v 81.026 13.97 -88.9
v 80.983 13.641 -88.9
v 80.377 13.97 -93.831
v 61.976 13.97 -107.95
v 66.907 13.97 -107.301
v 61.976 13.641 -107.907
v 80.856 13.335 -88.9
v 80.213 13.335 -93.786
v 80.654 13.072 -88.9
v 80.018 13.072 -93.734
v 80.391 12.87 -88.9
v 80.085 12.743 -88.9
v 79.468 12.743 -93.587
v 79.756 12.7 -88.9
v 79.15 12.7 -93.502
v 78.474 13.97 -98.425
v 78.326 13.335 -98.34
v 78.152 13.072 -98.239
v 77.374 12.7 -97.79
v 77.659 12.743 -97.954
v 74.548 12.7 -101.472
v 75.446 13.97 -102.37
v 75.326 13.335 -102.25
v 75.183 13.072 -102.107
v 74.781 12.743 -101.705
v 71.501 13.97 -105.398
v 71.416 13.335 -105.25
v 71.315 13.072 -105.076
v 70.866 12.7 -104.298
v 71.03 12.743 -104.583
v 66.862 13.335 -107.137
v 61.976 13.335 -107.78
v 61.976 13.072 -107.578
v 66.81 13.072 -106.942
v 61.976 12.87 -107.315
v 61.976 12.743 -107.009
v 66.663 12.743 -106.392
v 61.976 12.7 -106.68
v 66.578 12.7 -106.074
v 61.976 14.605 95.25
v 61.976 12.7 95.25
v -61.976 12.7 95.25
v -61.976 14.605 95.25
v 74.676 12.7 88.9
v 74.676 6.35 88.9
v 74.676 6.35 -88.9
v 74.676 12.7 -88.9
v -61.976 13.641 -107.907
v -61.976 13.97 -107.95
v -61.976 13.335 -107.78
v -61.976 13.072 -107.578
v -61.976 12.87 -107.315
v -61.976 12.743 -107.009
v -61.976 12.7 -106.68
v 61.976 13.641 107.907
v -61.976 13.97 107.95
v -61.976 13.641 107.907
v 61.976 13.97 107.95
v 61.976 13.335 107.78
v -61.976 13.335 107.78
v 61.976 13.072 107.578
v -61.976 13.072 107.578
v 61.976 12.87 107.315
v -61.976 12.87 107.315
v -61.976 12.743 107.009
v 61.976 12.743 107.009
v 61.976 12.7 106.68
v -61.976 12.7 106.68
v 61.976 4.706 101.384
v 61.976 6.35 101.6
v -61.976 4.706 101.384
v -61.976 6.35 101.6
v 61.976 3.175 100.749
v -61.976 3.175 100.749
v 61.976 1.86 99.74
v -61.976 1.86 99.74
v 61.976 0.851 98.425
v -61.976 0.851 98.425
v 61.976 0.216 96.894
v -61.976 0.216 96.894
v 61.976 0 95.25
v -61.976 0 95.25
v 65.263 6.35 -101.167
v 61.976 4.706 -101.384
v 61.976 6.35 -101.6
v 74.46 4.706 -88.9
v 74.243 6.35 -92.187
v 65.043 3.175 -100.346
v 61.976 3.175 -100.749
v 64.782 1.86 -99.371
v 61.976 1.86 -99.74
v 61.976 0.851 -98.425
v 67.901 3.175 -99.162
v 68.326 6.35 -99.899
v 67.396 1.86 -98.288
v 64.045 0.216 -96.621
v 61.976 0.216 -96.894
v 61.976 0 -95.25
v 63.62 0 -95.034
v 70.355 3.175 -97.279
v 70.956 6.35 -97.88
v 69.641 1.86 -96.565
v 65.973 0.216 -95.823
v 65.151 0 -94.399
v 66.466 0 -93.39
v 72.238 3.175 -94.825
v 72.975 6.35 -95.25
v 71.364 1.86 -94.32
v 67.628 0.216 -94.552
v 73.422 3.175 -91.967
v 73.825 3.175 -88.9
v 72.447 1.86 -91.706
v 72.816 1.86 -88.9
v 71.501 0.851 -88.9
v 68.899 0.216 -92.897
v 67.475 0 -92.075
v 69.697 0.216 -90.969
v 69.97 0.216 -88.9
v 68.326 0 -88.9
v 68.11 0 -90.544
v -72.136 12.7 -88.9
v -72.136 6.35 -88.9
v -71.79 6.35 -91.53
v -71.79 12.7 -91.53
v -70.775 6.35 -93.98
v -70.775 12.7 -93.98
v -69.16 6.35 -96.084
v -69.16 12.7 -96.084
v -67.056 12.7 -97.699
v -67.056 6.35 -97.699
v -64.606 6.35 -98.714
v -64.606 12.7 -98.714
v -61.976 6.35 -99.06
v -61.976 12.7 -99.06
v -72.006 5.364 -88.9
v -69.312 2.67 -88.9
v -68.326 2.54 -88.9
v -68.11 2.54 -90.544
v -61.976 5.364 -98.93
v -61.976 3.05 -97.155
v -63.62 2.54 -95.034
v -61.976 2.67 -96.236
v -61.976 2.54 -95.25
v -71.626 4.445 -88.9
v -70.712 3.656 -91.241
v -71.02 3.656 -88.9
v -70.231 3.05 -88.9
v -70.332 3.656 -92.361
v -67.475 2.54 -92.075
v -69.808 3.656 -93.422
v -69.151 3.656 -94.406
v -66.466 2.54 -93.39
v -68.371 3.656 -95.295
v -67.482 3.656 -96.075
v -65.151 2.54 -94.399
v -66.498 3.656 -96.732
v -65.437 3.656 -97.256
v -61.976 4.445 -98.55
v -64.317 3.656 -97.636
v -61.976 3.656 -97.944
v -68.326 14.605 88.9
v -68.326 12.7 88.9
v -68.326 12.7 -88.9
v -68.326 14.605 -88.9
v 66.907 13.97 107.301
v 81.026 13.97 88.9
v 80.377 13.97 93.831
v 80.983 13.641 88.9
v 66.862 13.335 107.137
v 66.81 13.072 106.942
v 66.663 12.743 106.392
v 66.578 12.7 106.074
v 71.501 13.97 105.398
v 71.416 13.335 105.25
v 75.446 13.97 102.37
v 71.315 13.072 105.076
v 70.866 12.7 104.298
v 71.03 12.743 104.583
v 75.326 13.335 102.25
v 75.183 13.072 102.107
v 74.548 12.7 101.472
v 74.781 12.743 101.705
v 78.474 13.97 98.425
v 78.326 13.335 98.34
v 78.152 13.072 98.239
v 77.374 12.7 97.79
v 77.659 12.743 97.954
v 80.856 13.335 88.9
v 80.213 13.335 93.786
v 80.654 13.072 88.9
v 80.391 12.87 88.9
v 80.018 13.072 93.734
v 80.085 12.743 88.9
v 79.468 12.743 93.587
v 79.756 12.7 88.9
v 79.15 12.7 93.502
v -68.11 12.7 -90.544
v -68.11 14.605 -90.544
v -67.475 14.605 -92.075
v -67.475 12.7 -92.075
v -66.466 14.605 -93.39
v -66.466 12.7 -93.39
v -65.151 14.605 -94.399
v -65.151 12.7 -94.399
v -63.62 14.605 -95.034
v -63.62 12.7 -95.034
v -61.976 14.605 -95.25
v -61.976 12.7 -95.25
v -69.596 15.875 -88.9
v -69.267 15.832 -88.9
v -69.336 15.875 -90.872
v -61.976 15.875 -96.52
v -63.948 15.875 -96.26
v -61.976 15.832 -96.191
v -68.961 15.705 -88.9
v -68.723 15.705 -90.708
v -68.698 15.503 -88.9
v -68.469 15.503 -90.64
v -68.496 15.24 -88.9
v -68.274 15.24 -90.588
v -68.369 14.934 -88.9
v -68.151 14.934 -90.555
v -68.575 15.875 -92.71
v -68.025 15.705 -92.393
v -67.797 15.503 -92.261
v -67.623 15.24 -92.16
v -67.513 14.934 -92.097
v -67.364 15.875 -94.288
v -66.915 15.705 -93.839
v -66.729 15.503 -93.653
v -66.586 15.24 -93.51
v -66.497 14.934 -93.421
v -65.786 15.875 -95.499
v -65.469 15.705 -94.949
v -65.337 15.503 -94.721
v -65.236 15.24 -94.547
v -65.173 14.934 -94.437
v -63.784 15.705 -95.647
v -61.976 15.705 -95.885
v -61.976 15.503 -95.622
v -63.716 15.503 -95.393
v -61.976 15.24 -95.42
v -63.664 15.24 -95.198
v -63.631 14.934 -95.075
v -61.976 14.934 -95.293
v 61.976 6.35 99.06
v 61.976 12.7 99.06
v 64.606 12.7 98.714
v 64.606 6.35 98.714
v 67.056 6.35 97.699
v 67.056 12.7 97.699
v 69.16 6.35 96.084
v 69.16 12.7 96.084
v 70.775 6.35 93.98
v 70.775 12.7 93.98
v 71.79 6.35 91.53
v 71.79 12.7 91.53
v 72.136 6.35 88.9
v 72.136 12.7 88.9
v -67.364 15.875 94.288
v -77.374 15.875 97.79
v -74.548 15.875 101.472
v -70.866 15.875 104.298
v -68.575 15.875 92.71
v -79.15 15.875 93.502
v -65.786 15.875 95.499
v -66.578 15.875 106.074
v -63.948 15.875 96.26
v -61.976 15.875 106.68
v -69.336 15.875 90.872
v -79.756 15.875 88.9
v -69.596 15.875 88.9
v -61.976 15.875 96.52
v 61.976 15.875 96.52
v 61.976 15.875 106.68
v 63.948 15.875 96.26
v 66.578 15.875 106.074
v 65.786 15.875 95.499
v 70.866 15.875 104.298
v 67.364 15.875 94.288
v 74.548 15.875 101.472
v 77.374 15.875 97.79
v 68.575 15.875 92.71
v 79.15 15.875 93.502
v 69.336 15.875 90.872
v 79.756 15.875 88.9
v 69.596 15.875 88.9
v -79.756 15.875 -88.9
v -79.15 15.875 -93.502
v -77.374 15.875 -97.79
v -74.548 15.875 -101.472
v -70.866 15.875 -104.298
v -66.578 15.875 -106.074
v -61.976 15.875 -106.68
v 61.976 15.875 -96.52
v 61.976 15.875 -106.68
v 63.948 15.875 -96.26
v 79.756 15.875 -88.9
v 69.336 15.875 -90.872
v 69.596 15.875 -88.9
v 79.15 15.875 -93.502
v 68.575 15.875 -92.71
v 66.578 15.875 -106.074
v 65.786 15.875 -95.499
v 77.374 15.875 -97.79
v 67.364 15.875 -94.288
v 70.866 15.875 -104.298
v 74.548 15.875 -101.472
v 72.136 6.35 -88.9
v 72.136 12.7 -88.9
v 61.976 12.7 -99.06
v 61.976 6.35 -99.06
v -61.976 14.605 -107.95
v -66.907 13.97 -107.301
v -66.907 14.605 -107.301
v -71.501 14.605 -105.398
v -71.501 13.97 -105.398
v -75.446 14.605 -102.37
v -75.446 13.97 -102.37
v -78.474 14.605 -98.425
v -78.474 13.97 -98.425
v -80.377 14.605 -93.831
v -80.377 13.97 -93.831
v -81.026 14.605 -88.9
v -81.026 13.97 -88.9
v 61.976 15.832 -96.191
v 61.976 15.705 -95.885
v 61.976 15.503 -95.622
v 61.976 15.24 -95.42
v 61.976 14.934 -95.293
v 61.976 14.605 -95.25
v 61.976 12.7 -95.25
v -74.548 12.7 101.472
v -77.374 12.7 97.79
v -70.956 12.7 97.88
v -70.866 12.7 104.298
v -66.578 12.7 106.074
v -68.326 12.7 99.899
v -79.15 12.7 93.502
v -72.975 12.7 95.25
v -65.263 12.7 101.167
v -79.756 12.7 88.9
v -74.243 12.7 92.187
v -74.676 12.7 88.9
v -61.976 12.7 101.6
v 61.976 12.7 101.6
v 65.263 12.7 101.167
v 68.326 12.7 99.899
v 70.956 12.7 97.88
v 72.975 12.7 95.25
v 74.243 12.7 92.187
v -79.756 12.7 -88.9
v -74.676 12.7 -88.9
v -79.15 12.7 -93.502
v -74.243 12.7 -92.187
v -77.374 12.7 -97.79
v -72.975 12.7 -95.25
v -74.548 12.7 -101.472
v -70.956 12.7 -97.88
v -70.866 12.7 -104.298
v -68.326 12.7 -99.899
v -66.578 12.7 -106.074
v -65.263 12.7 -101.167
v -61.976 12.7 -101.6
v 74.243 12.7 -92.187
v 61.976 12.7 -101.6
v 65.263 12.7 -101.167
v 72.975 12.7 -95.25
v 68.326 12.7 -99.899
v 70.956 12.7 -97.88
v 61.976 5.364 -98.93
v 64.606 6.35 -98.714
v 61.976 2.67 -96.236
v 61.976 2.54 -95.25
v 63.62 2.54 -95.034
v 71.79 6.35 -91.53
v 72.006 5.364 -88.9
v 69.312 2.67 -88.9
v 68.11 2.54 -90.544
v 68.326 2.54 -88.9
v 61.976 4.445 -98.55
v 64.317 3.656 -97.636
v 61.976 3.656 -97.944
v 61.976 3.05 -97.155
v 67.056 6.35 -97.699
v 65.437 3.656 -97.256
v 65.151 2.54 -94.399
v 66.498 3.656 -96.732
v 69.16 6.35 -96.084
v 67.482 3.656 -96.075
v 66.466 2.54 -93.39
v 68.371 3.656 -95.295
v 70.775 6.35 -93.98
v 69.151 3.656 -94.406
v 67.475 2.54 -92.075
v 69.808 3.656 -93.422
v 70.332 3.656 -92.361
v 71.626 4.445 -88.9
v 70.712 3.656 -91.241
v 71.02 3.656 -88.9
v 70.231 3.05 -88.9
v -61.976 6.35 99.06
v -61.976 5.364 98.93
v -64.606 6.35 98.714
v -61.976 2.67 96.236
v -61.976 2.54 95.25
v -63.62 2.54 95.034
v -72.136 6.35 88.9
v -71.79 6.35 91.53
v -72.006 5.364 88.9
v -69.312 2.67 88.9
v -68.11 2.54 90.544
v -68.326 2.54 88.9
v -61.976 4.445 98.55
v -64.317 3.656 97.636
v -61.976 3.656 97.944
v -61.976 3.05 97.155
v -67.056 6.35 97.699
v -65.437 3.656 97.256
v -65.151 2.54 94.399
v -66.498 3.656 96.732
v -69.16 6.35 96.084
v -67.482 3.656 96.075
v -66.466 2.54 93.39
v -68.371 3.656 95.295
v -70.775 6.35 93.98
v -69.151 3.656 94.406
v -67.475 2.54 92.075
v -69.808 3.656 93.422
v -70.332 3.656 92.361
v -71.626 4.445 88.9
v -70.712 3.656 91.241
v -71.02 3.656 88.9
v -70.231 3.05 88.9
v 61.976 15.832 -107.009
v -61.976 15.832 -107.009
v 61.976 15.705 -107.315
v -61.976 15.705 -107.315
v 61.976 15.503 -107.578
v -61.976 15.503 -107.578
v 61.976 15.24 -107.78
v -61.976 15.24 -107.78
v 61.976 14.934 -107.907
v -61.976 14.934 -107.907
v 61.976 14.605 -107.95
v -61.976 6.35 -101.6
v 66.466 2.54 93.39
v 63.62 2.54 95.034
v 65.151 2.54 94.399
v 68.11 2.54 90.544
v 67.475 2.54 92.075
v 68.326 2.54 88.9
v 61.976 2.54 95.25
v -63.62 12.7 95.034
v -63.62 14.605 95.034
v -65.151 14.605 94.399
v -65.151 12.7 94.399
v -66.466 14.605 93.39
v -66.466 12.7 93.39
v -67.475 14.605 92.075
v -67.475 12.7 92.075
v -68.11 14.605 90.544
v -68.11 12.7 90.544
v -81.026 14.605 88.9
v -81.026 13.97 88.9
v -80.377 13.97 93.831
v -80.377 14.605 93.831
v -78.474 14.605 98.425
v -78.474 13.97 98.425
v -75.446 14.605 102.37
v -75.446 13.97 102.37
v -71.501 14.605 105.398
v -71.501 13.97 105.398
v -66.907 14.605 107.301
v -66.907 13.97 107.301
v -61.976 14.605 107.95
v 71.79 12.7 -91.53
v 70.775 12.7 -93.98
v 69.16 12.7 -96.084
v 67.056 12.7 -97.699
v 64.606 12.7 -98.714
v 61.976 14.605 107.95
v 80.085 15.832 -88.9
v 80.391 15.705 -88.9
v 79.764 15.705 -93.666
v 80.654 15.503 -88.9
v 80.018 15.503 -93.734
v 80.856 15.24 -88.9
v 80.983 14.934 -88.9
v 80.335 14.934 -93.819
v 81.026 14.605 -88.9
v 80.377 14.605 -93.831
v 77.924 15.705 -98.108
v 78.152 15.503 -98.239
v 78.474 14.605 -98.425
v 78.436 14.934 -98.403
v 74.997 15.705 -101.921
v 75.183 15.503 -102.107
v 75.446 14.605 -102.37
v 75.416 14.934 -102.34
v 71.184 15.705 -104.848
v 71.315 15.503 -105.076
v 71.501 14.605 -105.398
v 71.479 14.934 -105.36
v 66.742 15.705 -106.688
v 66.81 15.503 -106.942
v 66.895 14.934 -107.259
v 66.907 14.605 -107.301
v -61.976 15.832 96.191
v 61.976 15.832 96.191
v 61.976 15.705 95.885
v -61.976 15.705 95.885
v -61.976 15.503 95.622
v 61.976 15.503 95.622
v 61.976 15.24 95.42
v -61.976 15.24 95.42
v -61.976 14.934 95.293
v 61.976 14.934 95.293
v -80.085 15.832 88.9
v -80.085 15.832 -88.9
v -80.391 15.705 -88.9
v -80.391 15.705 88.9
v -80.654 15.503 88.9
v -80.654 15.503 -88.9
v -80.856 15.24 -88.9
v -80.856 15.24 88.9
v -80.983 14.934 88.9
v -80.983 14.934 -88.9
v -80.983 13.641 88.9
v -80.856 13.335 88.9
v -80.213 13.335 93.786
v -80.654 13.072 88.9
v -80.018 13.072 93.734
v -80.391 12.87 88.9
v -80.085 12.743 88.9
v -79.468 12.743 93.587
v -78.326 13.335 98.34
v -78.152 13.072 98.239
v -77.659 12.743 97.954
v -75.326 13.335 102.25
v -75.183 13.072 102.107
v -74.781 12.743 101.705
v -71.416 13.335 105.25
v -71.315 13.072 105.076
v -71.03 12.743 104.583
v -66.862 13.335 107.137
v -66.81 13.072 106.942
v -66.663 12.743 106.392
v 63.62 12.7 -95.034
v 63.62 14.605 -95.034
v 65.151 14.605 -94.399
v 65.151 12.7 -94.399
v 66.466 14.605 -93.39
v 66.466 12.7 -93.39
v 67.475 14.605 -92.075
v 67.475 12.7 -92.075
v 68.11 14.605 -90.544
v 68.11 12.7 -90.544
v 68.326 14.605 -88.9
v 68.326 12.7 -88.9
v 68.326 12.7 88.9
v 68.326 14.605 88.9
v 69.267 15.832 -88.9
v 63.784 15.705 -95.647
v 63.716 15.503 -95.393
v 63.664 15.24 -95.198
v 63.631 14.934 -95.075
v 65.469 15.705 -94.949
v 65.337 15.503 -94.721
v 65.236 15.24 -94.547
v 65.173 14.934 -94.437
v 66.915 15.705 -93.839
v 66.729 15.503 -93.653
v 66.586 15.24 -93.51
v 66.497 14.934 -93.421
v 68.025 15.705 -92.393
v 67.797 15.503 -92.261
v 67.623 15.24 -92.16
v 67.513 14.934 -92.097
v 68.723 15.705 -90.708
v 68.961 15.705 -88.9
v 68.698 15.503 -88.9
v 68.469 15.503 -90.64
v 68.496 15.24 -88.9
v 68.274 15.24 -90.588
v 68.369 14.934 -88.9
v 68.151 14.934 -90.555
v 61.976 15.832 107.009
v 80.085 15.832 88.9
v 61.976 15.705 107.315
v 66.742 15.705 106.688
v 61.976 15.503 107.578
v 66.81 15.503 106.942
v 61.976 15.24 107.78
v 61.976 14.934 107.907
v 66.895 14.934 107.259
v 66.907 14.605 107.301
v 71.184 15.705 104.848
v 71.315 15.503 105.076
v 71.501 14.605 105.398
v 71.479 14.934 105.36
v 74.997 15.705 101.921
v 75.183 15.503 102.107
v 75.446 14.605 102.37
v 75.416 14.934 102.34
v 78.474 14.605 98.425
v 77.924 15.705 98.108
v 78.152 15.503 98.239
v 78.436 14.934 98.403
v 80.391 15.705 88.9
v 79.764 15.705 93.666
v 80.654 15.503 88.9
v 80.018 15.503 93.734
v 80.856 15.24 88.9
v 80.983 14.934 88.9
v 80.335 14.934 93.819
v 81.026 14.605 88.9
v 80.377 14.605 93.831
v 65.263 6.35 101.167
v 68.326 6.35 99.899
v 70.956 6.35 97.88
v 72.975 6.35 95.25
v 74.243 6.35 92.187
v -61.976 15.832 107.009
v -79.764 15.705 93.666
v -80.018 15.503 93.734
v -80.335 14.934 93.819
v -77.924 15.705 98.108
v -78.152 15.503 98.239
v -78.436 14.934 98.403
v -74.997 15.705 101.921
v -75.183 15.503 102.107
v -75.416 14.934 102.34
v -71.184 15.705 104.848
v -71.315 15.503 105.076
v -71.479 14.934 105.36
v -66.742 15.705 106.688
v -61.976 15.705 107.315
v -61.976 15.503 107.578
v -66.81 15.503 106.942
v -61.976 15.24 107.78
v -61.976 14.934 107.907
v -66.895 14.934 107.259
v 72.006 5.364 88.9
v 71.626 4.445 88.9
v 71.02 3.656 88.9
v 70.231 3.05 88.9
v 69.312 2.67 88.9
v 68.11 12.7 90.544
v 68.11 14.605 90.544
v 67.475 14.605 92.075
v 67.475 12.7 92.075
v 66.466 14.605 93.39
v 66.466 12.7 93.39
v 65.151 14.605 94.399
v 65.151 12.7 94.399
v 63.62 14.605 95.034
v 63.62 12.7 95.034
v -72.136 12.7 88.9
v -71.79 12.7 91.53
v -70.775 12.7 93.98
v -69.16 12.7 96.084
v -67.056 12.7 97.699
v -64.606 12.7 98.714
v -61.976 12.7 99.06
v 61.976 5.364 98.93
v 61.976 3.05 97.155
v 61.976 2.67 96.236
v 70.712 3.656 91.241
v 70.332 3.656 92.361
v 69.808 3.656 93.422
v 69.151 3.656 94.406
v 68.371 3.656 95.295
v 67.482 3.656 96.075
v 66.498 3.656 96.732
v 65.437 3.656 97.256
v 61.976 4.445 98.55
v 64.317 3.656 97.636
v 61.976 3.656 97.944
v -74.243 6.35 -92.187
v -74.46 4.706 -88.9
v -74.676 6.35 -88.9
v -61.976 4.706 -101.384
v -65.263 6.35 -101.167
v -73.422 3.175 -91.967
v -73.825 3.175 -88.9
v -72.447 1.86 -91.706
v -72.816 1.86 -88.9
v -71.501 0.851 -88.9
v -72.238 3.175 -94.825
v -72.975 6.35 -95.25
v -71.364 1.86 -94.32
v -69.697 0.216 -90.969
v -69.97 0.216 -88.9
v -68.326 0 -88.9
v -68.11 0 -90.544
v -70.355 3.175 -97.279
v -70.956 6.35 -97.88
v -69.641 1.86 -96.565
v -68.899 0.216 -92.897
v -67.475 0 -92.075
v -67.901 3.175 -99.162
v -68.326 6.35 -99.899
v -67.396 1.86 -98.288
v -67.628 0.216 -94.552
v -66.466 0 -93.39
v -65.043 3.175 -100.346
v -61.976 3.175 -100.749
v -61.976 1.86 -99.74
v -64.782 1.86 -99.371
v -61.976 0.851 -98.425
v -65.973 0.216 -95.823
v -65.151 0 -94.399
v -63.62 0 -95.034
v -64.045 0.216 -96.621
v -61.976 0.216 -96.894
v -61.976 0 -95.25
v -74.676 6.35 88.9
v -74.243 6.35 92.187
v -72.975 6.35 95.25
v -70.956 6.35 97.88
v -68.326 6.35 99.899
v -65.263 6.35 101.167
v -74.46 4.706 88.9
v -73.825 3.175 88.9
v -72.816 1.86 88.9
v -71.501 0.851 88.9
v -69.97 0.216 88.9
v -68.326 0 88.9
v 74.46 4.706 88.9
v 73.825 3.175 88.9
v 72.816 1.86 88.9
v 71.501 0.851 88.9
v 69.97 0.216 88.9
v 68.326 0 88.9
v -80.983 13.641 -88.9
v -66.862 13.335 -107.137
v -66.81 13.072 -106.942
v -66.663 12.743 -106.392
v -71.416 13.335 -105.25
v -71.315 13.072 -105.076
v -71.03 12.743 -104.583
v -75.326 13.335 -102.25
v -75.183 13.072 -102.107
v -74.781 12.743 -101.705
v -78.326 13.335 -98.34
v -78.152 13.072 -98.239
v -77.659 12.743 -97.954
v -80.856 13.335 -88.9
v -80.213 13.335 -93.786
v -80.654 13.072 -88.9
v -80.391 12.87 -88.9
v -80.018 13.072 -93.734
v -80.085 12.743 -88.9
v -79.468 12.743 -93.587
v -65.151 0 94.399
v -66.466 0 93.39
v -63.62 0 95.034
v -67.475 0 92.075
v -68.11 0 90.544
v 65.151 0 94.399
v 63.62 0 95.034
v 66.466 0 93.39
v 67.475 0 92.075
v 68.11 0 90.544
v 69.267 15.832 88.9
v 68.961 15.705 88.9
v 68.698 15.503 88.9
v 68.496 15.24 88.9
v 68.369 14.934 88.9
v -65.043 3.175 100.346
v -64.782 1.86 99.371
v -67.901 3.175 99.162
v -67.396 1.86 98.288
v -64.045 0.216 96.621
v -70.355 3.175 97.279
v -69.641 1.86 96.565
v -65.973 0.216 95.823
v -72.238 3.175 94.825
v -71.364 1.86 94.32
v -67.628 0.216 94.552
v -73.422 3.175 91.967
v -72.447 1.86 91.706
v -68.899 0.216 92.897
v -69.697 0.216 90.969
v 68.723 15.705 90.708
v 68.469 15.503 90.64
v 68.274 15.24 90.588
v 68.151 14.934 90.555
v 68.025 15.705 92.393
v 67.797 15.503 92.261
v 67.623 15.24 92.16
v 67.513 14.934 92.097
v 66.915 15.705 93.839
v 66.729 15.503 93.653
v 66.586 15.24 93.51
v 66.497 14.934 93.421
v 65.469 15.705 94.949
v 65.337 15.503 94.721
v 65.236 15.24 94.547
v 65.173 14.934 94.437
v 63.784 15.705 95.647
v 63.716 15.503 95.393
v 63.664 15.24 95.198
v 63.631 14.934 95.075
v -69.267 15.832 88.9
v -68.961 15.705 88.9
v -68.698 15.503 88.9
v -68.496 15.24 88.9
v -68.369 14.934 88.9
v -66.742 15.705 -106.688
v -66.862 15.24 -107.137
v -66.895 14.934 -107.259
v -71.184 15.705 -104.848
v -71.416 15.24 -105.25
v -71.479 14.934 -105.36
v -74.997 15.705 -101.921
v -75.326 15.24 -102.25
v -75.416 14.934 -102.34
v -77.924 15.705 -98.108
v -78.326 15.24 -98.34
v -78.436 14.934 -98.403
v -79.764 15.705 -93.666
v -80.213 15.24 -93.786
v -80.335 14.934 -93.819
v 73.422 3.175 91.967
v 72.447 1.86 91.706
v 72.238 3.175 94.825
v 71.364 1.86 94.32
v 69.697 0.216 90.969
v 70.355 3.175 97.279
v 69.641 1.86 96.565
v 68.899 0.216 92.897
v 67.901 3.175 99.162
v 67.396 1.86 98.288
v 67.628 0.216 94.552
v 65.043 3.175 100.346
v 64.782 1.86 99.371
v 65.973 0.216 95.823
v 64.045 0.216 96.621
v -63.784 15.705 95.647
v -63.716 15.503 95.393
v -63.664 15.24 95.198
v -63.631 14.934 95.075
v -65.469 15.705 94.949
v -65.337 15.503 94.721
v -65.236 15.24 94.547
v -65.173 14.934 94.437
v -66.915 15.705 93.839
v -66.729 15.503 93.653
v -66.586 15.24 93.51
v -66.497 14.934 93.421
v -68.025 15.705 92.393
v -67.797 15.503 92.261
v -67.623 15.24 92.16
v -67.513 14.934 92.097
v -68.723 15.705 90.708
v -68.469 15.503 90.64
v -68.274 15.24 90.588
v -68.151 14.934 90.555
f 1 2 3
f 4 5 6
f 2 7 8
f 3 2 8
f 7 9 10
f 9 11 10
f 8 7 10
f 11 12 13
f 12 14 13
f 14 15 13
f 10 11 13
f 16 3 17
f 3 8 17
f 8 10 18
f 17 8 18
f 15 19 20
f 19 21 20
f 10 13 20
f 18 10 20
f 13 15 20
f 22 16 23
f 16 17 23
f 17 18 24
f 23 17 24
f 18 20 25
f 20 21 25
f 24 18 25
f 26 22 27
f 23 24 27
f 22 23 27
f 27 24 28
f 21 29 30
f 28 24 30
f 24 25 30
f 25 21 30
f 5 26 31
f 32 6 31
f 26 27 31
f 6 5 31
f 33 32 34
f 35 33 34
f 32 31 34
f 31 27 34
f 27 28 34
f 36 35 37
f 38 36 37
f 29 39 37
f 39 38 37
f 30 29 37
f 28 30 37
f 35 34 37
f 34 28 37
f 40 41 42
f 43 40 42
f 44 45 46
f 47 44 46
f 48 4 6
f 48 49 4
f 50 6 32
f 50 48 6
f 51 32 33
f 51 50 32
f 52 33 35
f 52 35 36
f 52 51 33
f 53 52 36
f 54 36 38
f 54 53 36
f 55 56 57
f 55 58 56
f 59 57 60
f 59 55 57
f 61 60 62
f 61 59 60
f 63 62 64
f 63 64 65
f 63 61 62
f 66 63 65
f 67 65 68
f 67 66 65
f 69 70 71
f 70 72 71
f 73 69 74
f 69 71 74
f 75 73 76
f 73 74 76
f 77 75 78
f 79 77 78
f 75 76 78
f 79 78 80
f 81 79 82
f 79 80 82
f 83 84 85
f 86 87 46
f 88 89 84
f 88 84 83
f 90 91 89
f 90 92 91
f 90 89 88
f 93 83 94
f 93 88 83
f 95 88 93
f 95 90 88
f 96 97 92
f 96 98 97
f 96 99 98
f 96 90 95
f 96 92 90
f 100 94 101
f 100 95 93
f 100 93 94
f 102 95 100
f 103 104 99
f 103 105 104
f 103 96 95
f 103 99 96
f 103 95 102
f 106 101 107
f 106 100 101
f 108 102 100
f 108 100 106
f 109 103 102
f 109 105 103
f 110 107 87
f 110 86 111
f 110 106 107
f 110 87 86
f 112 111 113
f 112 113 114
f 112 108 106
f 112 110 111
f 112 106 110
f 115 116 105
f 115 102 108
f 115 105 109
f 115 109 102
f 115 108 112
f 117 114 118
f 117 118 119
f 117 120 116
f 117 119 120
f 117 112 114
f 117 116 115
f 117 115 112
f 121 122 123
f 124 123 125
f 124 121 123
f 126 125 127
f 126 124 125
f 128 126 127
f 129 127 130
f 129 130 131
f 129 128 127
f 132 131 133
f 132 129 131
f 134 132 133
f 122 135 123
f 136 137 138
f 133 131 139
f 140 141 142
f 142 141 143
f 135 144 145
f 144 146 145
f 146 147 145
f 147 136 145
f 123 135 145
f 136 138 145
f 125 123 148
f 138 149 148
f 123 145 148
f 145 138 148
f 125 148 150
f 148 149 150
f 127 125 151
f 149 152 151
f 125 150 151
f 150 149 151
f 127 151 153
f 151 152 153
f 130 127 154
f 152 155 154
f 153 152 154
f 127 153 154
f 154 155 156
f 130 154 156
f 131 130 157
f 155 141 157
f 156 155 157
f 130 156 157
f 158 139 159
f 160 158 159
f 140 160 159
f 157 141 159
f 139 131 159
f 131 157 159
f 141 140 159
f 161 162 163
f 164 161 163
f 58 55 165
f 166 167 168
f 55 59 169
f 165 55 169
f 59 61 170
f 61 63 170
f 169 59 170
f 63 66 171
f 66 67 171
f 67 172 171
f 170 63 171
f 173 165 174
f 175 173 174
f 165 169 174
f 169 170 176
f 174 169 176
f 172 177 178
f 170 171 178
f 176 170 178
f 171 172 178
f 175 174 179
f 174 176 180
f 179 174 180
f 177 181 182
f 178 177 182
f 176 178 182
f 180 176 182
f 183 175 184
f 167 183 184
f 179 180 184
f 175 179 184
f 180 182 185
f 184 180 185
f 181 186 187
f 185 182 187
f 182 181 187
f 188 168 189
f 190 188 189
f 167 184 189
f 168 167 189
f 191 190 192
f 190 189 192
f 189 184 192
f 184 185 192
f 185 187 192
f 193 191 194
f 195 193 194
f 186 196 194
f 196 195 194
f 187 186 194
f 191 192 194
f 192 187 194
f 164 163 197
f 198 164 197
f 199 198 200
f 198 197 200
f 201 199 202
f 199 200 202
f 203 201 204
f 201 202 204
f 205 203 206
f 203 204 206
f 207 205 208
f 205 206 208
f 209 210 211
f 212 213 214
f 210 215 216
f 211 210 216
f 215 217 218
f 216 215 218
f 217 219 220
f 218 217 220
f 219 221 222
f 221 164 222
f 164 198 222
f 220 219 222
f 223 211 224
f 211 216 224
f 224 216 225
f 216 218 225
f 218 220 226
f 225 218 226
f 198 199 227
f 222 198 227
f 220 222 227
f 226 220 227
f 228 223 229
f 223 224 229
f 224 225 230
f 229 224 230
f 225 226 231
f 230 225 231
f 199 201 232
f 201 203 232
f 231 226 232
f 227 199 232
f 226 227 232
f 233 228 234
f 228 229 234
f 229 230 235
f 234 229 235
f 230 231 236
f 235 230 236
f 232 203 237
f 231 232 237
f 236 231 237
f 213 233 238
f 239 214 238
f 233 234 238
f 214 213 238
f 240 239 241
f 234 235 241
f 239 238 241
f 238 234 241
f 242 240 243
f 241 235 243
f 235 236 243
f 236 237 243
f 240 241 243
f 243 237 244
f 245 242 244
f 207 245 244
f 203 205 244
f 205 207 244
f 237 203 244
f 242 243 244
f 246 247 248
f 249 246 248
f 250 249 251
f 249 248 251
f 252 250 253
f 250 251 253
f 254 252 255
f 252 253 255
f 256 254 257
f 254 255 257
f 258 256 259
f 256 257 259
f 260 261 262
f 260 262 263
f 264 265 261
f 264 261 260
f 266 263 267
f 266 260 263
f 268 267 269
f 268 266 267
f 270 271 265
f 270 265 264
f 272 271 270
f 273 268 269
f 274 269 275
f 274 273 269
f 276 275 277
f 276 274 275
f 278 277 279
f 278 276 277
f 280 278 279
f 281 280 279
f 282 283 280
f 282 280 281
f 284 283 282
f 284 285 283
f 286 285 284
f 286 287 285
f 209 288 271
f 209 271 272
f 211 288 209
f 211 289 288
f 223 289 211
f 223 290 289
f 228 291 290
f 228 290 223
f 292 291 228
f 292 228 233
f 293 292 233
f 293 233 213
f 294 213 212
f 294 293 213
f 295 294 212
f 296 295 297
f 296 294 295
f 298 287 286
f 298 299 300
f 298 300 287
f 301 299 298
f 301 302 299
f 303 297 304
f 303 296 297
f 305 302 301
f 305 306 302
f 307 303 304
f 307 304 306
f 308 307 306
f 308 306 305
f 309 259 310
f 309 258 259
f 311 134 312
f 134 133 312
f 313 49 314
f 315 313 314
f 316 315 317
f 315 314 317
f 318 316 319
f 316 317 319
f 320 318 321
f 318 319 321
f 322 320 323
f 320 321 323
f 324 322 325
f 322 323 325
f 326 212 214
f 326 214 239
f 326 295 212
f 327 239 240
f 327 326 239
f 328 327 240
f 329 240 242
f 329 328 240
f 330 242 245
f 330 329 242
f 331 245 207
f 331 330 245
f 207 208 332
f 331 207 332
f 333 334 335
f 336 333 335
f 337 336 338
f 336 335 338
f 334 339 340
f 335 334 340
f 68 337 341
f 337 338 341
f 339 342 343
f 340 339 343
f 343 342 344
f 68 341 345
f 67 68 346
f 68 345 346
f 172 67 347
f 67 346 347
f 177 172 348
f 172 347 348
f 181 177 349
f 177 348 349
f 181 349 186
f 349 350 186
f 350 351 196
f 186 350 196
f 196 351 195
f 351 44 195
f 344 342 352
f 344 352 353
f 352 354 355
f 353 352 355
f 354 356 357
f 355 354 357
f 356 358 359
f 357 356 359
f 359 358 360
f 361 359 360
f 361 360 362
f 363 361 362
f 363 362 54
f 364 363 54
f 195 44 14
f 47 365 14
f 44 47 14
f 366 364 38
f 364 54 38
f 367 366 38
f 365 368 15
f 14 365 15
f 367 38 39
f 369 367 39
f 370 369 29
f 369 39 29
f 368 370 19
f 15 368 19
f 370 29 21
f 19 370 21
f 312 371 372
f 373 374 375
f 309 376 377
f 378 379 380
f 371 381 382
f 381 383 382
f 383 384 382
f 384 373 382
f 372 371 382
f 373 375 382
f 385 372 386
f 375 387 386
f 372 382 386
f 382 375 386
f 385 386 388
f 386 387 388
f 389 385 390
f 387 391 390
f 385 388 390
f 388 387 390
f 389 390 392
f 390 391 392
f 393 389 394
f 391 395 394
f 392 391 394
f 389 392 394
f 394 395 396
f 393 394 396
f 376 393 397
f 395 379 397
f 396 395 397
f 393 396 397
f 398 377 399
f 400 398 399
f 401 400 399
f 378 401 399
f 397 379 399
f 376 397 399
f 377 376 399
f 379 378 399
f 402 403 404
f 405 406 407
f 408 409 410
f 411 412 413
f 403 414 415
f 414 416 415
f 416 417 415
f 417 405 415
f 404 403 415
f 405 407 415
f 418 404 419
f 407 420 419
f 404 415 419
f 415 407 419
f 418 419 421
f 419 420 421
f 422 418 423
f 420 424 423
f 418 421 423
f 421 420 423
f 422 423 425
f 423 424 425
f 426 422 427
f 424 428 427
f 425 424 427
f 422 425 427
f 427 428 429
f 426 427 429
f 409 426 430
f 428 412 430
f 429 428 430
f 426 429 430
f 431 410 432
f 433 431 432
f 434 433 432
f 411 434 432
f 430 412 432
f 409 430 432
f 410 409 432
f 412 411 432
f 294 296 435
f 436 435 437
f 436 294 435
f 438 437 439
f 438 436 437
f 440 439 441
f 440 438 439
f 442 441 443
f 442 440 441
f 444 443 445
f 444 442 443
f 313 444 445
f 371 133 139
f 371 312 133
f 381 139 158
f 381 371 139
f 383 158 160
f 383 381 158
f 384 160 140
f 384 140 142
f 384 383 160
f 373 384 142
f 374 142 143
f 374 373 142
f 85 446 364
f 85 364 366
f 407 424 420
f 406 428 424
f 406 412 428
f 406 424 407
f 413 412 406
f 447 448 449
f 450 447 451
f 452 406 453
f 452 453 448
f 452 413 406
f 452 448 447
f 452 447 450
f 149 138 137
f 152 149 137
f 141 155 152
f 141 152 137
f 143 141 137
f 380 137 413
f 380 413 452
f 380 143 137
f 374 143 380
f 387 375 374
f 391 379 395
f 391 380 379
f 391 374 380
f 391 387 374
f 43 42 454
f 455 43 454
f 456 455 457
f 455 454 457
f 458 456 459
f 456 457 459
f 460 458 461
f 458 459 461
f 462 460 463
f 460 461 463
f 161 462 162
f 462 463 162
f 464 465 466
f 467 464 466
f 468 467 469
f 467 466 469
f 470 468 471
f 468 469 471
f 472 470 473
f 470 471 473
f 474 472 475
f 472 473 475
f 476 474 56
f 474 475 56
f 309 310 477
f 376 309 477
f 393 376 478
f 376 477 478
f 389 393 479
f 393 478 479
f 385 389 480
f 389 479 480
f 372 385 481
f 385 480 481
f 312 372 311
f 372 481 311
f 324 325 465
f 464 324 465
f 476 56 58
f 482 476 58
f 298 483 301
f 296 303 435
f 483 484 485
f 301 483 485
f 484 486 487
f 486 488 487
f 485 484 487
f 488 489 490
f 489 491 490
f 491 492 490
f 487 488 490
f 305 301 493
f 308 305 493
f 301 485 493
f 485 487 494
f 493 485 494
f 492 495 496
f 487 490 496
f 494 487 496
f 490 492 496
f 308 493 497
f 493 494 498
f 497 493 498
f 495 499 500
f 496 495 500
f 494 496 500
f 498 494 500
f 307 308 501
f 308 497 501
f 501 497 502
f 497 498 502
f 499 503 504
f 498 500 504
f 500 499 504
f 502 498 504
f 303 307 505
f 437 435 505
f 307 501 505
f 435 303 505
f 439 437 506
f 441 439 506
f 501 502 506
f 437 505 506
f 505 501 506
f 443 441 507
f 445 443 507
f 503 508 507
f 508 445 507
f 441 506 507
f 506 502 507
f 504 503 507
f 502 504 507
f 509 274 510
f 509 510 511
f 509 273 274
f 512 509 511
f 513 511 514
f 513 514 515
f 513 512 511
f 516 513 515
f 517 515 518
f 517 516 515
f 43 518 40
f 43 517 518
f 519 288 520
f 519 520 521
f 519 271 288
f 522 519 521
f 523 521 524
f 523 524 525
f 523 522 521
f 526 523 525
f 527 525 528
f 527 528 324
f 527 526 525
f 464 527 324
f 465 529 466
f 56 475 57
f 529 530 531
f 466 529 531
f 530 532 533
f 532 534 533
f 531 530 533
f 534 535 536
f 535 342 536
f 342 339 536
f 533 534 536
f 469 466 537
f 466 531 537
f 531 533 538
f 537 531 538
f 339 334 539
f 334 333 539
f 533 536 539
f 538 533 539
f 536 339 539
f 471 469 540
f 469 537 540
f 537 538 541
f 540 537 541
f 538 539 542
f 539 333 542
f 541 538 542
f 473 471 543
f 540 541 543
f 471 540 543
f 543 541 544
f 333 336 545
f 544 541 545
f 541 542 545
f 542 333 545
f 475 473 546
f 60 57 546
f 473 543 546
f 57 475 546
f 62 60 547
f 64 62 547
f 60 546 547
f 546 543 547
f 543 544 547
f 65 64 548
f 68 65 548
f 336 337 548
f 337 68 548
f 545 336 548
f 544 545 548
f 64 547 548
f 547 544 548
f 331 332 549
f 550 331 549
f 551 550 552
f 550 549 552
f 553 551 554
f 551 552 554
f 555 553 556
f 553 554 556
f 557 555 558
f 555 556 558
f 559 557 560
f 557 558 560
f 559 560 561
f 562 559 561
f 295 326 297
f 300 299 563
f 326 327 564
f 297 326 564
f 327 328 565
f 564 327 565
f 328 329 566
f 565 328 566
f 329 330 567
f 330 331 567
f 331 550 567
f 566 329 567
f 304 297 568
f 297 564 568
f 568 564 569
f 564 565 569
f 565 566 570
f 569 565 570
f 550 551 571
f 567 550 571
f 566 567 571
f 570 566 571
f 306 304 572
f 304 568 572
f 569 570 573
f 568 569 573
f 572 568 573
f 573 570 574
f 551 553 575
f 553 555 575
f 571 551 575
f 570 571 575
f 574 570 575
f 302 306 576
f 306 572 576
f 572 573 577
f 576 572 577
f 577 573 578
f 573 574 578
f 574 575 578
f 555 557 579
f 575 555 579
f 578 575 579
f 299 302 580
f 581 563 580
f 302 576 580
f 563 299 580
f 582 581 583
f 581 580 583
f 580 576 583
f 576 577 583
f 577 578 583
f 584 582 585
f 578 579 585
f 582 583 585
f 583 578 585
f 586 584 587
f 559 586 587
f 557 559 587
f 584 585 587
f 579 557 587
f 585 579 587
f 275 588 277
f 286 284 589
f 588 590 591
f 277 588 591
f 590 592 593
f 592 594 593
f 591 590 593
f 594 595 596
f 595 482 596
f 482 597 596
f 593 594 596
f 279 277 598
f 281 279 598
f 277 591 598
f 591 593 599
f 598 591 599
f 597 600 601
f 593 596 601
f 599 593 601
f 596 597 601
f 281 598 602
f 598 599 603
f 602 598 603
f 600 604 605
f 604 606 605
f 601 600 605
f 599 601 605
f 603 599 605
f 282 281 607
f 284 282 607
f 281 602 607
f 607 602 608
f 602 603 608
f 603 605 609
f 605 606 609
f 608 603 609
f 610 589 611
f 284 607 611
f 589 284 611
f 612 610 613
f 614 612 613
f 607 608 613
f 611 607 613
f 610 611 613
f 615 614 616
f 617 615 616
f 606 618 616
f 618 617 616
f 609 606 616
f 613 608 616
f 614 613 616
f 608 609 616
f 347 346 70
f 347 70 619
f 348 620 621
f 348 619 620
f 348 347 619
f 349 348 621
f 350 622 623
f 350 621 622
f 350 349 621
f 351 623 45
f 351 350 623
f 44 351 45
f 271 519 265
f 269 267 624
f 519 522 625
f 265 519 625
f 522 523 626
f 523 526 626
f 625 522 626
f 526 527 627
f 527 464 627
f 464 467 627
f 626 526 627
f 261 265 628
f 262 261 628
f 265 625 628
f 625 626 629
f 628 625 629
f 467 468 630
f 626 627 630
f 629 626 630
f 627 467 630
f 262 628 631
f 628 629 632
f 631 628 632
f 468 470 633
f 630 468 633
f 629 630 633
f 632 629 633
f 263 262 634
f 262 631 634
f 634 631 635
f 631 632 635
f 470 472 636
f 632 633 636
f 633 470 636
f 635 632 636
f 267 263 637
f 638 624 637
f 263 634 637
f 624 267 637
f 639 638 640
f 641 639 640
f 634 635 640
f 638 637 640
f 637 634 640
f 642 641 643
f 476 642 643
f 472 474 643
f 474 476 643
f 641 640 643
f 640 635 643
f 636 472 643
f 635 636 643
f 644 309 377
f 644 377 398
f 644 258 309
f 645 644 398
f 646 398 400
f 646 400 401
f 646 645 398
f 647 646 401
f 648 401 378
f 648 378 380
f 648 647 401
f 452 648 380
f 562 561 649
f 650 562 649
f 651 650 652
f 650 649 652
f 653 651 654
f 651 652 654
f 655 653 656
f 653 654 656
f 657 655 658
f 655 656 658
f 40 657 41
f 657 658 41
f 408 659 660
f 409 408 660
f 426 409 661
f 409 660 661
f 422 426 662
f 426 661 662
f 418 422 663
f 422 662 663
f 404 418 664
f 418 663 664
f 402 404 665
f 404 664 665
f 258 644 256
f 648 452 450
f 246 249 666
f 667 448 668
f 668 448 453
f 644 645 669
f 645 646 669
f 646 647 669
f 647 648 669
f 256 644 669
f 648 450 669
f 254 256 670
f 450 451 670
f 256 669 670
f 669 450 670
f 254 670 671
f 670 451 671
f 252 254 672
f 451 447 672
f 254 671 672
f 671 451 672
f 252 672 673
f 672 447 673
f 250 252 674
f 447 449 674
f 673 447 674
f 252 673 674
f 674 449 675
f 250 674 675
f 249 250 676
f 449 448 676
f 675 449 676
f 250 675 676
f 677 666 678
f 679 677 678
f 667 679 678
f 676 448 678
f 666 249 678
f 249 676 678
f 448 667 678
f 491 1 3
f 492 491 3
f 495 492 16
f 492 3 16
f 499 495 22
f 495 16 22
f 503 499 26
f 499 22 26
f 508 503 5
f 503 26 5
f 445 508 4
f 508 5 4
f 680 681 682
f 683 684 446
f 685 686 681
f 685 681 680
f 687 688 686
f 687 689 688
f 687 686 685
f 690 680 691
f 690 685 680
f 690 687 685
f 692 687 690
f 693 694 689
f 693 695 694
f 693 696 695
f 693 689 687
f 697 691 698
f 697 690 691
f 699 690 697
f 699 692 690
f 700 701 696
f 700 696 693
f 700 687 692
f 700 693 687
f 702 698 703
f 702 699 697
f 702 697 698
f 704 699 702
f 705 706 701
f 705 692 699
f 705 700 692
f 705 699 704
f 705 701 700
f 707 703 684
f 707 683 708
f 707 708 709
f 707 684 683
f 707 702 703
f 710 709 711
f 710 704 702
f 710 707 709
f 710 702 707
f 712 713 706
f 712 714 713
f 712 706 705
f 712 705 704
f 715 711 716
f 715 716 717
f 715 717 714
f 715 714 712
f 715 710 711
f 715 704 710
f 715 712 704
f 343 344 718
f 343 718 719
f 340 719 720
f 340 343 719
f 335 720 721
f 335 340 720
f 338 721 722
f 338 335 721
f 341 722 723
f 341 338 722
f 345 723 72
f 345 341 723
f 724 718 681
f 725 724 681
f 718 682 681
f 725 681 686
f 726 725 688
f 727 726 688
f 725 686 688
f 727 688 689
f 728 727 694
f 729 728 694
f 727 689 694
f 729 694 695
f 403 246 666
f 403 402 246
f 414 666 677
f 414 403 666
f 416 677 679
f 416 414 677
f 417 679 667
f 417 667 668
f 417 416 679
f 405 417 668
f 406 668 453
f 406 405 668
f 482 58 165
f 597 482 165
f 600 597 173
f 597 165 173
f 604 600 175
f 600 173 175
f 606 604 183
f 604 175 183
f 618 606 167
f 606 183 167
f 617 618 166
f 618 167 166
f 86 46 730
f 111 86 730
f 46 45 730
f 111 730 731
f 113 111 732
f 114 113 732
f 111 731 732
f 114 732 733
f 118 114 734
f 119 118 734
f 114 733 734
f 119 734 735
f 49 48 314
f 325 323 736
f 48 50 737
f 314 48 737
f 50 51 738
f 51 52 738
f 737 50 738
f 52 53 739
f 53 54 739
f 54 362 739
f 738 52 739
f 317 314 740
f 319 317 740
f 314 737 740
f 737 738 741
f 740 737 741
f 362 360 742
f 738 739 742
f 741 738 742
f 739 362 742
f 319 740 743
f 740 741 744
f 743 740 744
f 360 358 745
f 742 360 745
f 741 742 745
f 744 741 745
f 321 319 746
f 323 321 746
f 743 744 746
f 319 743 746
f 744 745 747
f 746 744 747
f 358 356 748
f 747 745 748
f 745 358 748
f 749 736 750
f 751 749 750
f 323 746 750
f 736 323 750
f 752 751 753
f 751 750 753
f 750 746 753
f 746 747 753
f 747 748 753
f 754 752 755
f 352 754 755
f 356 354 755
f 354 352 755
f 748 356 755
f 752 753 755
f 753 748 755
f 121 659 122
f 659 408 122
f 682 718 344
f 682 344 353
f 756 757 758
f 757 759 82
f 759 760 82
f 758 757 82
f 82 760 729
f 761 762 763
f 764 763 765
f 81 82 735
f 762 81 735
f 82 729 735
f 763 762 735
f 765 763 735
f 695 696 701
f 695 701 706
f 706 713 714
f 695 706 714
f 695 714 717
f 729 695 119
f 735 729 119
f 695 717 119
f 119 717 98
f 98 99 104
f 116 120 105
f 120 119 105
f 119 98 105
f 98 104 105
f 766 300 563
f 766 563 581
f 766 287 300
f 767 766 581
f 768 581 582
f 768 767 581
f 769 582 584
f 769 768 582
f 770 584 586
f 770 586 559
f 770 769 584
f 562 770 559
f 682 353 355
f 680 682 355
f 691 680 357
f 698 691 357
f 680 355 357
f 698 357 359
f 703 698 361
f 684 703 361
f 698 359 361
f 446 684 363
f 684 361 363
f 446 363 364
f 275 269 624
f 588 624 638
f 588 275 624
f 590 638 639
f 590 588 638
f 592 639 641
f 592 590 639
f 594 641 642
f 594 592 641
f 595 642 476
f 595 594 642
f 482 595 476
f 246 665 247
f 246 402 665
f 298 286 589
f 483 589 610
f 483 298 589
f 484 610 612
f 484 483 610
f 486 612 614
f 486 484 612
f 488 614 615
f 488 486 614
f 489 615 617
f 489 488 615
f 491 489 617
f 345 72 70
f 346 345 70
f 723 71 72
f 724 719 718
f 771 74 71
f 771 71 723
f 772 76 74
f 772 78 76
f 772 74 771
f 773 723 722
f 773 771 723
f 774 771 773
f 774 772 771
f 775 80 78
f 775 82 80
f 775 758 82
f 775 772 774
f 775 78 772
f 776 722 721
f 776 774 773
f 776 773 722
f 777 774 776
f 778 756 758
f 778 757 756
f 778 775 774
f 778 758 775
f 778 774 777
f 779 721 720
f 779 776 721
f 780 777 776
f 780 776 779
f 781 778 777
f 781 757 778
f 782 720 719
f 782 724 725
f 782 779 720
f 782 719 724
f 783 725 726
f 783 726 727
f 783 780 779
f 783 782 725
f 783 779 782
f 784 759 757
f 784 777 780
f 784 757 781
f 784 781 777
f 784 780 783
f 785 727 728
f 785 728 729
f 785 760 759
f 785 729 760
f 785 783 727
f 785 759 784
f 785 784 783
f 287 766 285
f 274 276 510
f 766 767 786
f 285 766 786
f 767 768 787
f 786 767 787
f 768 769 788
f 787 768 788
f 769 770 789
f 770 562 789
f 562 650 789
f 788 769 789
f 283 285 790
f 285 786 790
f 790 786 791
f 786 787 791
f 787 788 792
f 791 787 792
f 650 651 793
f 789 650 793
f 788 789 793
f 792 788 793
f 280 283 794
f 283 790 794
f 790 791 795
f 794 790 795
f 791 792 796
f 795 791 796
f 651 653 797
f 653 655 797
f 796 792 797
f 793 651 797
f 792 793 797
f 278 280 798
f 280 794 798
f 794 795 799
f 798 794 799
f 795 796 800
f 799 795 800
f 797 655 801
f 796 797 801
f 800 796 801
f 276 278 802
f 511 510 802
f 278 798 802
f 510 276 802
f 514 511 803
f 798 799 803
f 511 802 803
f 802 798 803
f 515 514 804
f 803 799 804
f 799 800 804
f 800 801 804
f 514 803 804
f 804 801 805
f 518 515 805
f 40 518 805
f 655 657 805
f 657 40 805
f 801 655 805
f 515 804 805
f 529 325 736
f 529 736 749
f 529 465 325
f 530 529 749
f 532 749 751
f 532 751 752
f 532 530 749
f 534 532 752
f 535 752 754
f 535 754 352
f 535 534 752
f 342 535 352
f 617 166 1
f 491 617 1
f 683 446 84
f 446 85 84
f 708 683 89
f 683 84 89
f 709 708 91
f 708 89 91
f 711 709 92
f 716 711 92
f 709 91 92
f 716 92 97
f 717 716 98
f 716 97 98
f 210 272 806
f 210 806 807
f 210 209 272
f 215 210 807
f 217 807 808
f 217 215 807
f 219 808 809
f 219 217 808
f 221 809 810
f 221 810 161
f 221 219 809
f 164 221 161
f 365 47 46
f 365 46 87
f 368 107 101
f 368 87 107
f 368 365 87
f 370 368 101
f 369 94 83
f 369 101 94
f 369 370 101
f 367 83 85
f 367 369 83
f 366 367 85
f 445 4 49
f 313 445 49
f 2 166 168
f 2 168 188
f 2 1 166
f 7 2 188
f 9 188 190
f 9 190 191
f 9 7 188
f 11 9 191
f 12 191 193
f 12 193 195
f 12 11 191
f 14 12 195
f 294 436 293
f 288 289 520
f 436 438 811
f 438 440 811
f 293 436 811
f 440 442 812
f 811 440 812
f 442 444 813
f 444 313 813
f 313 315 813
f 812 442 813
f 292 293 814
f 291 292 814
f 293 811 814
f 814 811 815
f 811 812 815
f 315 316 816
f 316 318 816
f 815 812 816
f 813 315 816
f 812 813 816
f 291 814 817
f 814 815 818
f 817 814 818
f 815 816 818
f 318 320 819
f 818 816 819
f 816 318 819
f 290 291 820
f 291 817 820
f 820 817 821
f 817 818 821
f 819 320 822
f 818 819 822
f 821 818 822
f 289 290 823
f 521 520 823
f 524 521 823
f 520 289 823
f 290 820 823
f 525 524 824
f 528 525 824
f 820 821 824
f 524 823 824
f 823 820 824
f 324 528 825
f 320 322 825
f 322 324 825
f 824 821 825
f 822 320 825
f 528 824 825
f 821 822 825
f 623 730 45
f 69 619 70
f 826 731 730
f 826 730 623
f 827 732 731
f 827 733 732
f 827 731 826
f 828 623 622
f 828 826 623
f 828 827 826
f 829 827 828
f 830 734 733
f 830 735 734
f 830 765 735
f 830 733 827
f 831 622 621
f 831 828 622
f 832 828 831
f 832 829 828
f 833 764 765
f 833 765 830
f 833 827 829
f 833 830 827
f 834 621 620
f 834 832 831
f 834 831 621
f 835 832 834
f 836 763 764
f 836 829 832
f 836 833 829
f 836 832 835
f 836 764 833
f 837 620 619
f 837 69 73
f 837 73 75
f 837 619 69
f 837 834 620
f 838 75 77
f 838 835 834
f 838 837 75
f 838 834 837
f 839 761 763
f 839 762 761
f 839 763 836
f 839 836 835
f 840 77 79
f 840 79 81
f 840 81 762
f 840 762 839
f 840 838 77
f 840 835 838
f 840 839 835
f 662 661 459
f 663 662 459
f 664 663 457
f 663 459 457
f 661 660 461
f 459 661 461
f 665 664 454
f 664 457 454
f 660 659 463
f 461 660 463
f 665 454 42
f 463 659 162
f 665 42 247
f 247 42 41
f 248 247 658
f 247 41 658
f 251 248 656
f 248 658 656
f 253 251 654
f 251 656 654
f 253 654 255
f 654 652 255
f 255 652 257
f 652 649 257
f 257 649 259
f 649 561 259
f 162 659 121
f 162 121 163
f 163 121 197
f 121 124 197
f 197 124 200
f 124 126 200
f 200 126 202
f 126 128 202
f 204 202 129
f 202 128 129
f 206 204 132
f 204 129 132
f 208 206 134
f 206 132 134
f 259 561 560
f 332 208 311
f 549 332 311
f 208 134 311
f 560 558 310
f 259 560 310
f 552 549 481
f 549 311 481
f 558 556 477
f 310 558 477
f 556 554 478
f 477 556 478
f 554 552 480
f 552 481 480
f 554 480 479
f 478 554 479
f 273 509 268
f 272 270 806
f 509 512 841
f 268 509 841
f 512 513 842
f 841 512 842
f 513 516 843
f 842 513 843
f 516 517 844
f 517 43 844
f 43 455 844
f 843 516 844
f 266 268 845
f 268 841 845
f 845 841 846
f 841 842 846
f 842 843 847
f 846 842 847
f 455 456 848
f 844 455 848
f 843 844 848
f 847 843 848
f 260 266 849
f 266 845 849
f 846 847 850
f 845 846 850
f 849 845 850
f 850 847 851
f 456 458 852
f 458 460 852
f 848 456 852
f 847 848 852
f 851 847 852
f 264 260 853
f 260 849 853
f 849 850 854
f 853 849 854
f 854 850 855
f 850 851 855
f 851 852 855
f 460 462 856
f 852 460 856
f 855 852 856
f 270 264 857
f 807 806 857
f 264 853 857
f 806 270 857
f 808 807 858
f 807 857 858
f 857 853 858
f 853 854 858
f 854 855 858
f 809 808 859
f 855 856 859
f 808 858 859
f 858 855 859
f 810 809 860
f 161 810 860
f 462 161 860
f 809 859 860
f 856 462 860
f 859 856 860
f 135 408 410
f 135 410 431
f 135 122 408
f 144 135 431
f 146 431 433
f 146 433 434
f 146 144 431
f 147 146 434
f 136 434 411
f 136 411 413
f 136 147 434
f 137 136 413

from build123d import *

# Parameters (mm, degrees)
SKETCH1_W           = 149.352
SKETCH1_H           = 203.2
BOSS_EXTRUDE1_DEPTH = 12.7
FILLET1_R           = 12.7
FILLET3_R           = 6.35
SHELL1_T            = -2.54
BOSS_EXTRUDE2_DEPTH = 3.175
FILLET2_R           = 1.27


with BuildPart() as part:
    # Sketch1 → Boss-Extrude1 (new body)
    with BuildSketch(Plane(origin=(0, 0, 0), x_dir=(1, 0, 0), z_dir=(0, 1, 0))):
        Rectangle(SKETCH1_W, SKETCH1_H)
    extrude(amount=BOSS_EXTRUDE1_DEPTH)

    # Fillet1
    fillet1_edges = [part.edges().sort_by_distance(p)[0] for p in [
        (74.676, 6.35, 101.6),
        (-74.676, 6.35, 101.6),
        (-74.676, 6.35, -101.6),
        (74.676, 6.35, -101.6),
    ]]
    fillet(fillet1_edges, radius=FILLET1_R)

    # Fillet3
    fillet3_edges = [part.edges().sort_by_distance(p)[0] for p in [
        (-74.676, 0, 0),
        (74.676, 0, 0),
        (0, 0, 101.6),
        (0, 0, -101.6),
        (70.956256121, 0, 97.880256121),
        (70.956256121, 0, -97.880256121),
        (-70.956256121, 0, 97.880256121),
        (-70.956256121, 0, -97.880256121),
    ]]
    fillet(fillet3_edges, radius=FILLET3_R)

    # Shell1
    shell1_openings = [part.faces().sort_by_distance(p)[0] for p in [
        (0, 12.7, 0),
    ]]
    offset(amount=SHELL1_T, openings=shell1_openings, kind=Kind.INTERSECTION)

    # Sketch2 → Boss-Extrude2 (add)
    with BuildSketch(Plane(origin=(0, 12.7, 0), x_dir=(1, 0, 0), z_dir=(0, 1, 0))):
        with BuildLine():
            Line((61.976, 107.95), (-61.976, 107.95))
            ThreePointArc((-61.976, 107.95), (-75.446384182, 102.370384182), (-81.026, 88.9))
            Line((-81.026, 88.9), (-81.026, -88.9))
            ThreePointArc((-81.026, -88.9), (-75.446384182, -102.370384182), (-61.976, -107.95))
            Line((-61.976, -107.95), (61.976, -107.95))
            ThreePointArc((61.976, -107.95), (75.446384182, -102.370384182), (81.026, -88.9))
            Line((81.026, -88.9), (81.026, 88.9))
            ThreePointArc((81.026, 88.9), (75.446384182, 102.370384182), (61.976, 107.95))
        make_face()
        with BuildLine():
            Line((-68.326, -88.9), (-68.326, 88.9))
            ThreePointArc((-68.326, 88.9), (-66.466128061, 93.390128061), (-61.976, 95.25))
            Line((-61.976, 95.25), (61.976, 95.25))
            ThreePointArc((61.976, 95.25), (66.466128061, 93.390128061), (68.326, 88.9))
            Line((68.326, 88.9), (68.326, -88.9))
            ThreePointArc((68.326, -88.9), (66.466128061, -93.390128061), (61.976, -95.25))
            Line((61.976, -95.25), (-61.976, -95.25))
            ThreePointArc((-61.976, -95.25), (-66.466128061, -93.390128061), (-68.326, -88.9))
        make_face(mode=Mode.SUBTRACT)
    extrude(amount=BOSS_EXTRUDE2_DEPTH)

    # Fillet2
    fillet2_edges = [part.edges().sort_by_distance(p)[0] for p in [
        (-81.026, 15.875, 0),
        (-75.446384182, 15.875, 102.370384182),
        (0, 15.875, 107.95),
        (75.446384182, 15.875, 102.370384182),
        (81.026, 15.875, 0),
        (75.446384182, 12.7, -102.370384182),
        (0, 12.7, -107.95),
        (-75.446384182, 12.7, -102.370384182),
        (-81.026, 12.7, 0),
        (-75.446384182, 12.7, 102.370384182),
        (0, 12.7, 107.95),
        (75.446384182, 12.7, 102.370384182),
        (81.026, 12.7, 0),
        (-66.466128061, 15.875, 93.390128061),
        (0, 15.875, 95.25),
        (66.466128061, 15.875, 93.390128061),
        (68.326, 15.875, 0),
        (66.466128061, 15.875, -93.390128061),
        (0, 15.875, -95.25),
        (-66.466128061, 15.875, -93.390128061),
        (-68.326, 15.875, 0),
        (75.446384182, 15.875, -102.370384182),
        (0, 15.875, -107.95),
        (-75.446384182, 15.875, -102.370384182),
    ]]
    fillet(fillet2_edges, radius=FILLET2_R)


solid = part.part
